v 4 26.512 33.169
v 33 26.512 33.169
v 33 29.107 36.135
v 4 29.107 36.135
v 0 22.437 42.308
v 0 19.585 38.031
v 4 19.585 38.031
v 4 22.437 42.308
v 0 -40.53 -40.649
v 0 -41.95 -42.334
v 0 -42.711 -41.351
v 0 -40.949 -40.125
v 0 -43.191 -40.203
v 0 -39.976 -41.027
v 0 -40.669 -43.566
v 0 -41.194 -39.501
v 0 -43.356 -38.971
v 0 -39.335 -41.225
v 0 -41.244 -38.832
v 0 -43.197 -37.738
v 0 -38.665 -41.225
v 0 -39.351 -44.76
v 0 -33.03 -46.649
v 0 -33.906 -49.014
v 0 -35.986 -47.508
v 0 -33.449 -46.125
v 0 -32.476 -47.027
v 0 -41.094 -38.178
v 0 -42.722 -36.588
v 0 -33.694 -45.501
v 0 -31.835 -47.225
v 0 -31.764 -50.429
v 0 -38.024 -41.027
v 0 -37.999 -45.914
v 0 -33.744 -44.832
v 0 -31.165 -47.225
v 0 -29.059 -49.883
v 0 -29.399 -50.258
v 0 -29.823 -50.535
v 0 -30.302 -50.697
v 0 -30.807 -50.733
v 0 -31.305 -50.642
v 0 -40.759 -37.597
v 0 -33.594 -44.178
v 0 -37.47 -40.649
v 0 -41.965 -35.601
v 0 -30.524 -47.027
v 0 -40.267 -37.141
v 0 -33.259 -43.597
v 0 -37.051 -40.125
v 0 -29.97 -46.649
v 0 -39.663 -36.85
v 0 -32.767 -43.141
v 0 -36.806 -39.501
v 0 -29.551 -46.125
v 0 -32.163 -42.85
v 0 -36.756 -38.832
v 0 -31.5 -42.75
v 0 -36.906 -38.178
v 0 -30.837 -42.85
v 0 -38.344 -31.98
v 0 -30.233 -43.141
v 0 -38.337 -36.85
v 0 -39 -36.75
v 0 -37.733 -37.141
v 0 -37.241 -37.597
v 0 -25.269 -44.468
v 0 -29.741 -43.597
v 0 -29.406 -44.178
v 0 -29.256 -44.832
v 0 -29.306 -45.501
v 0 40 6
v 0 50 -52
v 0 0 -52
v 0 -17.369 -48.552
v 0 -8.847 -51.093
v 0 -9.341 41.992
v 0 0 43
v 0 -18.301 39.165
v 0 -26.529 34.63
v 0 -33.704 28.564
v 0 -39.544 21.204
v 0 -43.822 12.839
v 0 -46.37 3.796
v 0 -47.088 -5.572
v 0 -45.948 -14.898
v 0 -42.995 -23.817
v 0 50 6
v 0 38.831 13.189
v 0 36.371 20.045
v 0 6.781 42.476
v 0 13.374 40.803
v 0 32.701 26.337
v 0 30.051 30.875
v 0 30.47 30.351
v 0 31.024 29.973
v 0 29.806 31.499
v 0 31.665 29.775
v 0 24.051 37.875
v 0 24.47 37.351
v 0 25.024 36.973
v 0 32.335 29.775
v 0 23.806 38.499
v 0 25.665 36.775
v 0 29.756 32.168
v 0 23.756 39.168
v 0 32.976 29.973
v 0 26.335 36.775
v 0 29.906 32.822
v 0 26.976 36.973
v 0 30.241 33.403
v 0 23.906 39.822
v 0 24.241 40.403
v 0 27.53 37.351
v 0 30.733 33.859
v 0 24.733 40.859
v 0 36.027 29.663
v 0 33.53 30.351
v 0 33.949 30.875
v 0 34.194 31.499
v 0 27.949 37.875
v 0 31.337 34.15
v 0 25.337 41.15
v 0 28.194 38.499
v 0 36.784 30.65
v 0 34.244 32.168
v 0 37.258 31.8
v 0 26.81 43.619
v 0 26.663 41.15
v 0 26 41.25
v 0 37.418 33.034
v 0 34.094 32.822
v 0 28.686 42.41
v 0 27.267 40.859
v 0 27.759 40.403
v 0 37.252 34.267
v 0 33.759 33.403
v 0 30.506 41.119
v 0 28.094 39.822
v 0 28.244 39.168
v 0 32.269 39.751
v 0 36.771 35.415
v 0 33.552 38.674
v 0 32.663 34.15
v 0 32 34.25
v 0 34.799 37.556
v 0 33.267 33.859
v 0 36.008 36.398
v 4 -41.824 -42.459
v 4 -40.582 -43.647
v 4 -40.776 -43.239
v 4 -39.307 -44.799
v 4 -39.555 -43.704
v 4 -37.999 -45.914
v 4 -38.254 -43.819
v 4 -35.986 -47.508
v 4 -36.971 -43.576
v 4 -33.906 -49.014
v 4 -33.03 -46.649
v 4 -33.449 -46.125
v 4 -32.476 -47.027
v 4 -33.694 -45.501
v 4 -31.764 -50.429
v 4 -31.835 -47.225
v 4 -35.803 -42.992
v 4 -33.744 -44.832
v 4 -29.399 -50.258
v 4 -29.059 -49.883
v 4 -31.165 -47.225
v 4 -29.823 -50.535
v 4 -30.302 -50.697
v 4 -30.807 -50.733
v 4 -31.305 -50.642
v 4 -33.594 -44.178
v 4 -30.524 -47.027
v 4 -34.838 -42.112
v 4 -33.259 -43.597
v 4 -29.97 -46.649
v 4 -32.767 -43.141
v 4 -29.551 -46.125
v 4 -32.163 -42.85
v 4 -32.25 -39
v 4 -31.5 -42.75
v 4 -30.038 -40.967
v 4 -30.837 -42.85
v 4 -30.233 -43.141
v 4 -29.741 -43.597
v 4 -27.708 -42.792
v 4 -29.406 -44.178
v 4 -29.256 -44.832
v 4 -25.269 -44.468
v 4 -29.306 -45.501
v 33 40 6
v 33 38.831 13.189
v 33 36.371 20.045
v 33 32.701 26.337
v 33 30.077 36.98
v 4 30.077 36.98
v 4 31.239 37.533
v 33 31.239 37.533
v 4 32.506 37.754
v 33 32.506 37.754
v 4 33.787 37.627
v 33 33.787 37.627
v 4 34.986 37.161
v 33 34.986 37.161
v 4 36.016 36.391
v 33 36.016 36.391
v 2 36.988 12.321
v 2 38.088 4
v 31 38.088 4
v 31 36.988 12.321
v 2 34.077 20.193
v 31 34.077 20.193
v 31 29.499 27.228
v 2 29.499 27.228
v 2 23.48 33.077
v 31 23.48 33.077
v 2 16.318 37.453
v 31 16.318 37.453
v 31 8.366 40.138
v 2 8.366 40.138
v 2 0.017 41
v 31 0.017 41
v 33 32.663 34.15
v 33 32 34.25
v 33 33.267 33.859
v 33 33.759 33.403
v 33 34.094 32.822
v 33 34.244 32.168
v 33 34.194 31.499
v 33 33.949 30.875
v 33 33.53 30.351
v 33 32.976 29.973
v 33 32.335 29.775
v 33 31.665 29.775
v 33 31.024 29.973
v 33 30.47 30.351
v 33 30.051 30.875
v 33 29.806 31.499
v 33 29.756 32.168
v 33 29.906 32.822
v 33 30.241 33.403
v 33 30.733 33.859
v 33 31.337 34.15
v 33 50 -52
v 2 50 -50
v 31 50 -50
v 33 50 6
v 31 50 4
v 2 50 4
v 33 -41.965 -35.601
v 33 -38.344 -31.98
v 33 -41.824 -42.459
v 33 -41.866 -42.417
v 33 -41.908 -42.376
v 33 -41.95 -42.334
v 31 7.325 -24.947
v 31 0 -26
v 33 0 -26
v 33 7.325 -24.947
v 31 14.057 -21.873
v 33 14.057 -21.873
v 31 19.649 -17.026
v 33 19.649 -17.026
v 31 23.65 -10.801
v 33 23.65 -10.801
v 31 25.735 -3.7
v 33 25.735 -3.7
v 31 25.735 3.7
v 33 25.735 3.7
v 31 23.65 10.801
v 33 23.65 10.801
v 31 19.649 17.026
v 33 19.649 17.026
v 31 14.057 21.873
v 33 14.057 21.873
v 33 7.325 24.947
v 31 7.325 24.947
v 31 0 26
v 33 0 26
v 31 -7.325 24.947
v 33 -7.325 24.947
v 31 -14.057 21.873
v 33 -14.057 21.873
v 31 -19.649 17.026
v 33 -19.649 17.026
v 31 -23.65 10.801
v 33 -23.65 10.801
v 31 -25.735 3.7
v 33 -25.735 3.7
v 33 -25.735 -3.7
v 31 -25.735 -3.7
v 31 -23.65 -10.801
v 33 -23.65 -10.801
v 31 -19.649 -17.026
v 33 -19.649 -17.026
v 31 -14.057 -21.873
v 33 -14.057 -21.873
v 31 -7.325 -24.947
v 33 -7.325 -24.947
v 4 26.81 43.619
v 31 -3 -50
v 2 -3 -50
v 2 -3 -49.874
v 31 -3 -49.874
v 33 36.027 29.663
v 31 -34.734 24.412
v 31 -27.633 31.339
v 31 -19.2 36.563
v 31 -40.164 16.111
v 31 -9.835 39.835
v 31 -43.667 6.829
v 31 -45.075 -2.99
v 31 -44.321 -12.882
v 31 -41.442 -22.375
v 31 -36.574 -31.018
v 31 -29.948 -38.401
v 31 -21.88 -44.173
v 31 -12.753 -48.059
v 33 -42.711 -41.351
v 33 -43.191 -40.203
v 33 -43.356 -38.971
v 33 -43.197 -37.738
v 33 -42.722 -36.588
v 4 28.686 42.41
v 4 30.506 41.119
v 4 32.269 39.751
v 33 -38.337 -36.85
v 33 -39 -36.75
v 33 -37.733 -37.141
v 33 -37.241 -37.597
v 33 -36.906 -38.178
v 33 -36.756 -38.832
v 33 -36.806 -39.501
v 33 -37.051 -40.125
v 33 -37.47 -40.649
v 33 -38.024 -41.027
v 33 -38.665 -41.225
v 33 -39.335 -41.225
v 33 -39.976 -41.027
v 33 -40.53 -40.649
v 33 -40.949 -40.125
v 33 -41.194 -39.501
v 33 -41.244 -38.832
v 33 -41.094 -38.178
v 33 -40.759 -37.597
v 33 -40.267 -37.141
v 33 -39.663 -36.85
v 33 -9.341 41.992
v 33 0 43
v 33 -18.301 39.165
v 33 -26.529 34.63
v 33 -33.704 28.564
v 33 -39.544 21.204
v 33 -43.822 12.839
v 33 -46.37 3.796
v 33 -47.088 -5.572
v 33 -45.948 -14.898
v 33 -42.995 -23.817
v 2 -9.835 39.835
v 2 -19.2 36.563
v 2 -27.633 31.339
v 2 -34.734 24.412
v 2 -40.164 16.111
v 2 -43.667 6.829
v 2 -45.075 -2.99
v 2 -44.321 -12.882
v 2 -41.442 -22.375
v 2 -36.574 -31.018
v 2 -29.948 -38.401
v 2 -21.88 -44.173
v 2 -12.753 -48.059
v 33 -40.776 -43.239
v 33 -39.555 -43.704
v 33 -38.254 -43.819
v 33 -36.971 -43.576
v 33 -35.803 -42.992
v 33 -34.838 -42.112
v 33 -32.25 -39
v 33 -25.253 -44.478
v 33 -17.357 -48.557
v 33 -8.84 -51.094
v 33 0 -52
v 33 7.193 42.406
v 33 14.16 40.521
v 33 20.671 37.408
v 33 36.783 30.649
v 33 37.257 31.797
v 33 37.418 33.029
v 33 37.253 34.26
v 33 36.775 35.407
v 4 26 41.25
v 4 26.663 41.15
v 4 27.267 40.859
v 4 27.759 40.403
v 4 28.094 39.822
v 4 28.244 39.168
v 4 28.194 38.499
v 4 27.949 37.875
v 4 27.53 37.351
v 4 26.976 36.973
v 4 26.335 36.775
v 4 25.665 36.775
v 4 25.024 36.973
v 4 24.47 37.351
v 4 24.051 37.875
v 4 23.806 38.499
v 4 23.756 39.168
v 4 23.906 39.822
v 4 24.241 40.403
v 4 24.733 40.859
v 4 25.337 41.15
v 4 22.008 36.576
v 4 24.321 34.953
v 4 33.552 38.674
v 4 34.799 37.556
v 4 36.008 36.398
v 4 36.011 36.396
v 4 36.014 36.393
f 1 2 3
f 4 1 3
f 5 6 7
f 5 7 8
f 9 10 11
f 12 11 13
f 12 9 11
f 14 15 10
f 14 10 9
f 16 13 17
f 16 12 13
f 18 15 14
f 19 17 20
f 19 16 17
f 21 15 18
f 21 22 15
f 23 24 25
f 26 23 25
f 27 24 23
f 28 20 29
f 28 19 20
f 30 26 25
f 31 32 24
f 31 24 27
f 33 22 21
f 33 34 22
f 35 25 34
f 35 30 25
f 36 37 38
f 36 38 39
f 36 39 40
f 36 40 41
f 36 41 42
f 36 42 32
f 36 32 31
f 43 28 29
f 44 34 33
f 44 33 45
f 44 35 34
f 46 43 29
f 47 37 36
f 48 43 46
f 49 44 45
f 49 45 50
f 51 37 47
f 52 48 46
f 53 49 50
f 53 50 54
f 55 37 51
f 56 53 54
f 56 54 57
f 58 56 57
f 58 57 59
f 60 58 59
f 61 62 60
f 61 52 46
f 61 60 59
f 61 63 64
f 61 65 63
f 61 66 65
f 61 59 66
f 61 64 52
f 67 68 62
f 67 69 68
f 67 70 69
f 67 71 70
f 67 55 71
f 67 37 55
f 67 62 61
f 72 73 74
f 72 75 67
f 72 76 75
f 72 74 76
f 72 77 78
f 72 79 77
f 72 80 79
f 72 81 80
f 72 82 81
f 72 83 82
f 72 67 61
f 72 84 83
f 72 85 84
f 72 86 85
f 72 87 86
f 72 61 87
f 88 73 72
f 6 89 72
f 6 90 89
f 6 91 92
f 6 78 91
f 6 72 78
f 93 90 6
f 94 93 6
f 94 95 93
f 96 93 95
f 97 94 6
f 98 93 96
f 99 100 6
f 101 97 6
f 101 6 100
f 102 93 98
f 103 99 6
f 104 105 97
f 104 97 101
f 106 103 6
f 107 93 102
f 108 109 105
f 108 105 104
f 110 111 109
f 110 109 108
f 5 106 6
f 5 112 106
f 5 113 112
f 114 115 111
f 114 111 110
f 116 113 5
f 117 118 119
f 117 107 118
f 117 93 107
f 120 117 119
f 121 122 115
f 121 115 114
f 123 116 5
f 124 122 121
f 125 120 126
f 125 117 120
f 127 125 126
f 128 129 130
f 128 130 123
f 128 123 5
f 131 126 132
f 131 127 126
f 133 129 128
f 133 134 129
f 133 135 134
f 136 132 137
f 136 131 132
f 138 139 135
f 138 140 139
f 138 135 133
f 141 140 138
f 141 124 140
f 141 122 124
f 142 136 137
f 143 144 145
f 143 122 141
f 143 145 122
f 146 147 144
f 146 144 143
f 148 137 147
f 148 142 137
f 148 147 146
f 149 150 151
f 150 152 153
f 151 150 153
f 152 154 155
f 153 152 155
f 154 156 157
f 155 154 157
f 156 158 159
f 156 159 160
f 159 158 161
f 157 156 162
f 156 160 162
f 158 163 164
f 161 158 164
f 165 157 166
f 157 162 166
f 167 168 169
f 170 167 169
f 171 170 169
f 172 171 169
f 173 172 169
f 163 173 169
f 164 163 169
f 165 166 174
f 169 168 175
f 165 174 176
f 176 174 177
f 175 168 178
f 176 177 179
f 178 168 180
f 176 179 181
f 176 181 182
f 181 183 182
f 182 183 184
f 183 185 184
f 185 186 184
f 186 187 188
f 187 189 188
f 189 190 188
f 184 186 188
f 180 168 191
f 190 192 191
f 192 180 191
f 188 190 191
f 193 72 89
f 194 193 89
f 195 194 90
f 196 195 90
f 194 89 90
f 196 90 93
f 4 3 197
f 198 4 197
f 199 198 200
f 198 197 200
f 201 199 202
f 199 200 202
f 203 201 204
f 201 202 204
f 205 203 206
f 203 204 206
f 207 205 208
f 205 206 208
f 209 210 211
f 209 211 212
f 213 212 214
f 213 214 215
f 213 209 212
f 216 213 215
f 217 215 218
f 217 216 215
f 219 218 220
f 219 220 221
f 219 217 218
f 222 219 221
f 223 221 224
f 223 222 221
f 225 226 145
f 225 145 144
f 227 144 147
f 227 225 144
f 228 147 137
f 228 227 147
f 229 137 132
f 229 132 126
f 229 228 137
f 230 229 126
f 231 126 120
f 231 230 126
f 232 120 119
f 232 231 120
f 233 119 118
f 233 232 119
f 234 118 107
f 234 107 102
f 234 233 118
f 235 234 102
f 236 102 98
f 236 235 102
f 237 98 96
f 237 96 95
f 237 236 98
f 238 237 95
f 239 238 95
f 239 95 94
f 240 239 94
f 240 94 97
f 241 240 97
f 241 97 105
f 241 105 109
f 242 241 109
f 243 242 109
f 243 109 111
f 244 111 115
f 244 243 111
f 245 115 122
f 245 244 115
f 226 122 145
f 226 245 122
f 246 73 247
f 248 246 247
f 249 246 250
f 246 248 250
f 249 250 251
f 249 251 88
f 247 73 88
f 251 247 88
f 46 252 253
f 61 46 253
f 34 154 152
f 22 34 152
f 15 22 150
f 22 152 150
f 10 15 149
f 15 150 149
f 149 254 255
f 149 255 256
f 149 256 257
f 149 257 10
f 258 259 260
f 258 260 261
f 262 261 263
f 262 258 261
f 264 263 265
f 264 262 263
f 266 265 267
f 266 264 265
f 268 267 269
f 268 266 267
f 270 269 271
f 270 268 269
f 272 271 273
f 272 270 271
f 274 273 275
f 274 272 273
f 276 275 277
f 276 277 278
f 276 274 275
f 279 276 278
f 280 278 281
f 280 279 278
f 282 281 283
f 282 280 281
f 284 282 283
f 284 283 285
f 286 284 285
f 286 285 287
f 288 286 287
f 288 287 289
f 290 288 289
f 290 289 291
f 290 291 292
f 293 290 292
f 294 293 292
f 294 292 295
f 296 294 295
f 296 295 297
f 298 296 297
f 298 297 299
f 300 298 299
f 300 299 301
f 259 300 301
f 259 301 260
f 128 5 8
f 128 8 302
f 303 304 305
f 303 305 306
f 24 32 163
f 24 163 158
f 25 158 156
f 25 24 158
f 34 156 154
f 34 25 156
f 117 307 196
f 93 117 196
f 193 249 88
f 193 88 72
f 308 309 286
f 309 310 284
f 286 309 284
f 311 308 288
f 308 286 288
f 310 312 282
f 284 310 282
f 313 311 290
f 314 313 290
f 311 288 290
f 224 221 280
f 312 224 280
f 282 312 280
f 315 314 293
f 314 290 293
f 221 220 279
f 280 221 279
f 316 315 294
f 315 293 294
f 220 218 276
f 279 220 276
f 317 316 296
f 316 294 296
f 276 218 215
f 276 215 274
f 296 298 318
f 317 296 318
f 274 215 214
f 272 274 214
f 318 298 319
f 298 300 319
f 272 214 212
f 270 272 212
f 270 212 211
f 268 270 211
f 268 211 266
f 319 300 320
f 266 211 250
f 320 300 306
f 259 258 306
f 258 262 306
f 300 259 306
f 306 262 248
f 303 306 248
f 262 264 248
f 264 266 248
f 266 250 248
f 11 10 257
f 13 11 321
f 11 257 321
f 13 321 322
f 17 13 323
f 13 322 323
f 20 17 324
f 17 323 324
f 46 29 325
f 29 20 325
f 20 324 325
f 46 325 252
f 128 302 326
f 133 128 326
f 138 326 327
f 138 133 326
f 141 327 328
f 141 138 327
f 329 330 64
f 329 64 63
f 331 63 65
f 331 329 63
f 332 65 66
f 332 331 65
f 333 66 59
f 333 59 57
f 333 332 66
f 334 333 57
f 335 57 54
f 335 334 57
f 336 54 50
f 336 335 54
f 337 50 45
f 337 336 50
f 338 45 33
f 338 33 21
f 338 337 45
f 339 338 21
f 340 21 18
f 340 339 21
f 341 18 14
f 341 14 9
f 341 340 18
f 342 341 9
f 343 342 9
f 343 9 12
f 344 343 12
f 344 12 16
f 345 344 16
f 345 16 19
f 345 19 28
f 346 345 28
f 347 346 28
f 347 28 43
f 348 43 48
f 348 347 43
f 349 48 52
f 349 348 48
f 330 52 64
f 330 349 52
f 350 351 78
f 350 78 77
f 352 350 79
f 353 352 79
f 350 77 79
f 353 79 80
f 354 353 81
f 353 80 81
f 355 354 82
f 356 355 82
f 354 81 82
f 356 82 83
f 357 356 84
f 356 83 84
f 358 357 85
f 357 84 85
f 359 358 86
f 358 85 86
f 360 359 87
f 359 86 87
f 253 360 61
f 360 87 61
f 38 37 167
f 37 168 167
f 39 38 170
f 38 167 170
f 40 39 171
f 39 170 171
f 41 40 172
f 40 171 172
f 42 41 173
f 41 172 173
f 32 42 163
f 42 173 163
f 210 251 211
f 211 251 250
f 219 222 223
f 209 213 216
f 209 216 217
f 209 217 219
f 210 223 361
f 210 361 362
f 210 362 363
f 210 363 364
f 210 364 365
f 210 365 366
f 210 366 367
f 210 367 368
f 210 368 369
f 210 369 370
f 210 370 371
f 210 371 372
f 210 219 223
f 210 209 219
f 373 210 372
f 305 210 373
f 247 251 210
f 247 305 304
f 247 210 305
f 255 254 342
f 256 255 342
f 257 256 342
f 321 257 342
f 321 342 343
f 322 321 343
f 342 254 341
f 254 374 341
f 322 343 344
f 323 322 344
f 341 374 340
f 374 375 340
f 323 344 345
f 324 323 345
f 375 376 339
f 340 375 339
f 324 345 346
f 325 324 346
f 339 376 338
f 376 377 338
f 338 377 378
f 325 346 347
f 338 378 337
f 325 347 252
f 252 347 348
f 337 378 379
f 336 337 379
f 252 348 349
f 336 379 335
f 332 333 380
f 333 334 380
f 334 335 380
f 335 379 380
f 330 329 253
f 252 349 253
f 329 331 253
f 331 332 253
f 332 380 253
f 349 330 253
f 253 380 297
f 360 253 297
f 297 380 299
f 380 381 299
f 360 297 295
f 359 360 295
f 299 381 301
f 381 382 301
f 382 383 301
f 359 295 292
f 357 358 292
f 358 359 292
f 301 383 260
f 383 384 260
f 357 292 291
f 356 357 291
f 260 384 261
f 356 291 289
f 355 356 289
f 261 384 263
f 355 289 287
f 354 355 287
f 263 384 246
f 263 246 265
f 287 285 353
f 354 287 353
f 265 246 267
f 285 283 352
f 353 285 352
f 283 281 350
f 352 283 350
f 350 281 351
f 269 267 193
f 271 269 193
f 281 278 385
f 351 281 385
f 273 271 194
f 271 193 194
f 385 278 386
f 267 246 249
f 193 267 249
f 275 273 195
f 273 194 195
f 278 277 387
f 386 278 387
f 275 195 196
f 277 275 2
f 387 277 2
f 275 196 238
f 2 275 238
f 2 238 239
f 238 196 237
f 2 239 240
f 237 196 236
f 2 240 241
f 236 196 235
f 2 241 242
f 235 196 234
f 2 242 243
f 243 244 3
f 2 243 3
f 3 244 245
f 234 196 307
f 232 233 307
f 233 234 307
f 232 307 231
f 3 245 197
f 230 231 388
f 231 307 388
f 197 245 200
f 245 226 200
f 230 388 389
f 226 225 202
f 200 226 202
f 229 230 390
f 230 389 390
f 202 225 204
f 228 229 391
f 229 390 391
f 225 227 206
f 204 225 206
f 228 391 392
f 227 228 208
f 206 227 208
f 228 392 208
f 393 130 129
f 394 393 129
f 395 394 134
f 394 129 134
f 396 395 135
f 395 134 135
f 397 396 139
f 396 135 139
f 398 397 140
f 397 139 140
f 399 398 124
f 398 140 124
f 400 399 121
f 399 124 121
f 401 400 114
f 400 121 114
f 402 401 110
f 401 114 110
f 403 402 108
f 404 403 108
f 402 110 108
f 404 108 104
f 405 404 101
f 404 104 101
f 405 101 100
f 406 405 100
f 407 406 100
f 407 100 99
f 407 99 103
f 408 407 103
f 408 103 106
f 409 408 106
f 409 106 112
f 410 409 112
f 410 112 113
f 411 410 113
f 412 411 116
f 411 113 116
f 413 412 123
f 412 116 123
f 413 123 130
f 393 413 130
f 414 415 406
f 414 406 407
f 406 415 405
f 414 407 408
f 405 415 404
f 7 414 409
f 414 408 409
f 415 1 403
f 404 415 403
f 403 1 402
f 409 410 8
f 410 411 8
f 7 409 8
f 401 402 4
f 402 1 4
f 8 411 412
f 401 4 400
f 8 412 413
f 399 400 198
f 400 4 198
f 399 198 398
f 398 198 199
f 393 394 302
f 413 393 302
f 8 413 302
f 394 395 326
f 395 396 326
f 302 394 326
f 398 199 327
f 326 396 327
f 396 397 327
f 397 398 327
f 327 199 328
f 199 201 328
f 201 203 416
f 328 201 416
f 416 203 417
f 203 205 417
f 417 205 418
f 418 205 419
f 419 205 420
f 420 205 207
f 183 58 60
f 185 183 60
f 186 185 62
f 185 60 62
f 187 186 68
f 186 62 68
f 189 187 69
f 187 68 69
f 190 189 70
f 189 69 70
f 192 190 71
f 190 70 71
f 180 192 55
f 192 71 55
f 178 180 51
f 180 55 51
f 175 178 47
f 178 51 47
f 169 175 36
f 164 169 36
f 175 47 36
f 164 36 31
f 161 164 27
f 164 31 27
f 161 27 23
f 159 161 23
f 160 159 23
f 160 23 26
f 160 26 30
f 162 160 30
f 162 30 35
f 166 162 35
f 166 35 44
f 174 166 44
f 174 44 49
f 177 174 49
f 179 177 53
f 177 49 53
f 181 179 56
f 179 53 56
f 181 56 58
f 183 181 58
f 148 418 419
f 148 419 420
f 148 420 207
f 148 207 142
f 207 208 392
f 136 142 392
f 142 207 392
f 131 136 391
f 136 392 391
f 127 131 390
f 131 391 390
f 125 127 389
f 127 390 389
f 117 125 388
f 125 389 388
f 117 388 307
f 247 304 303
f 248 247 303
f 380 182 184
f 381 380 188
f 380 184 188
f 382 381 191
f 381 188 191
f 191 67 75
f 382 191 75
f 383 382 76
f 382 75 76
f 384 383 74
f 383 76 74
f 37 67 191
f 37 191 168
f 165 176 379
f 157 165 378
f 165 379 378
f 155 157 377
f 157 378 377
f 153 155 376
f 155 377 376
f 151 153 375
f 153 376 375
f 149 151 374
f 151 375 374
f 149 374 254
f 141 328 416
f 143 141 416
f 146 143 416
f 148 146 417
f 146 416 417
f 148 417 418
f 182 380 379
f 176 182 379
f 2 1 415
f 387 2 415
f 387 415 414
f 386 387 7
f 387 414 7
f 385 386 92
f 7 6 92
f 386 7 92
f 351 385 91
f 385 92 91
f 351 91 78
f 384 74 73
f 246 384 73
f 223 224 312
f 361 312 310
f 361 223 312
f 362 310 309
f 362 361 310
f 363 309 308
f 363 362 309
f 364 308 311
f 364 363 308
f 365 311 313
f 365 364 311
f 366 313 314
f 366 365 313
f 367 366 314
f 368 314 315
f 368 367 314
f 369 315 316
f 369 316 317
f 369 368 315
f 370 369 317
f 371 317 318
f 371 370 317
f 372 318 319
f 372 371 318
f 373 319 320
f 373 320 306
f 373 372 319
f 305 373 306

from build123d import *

# Parameters (mm, degrees)
SKETCH1_R               = 26
BOSS_EXTRUDE1_DEPTH     = 33
SHELL1_START            = 2
SHELL1_OUTLINE_R        = 28
SHELL1_DEPTH            = 29
SKETCH2_W               = 29
SKETCH2_H               = 54
CUT_EXTRUDE1_DEPTH      = 53
SKETCH3_R               = 26
BOSS_EXTRUDE2_DEPTH     = 2
SKETCH4_R               = 31.708367963
CUT_EXTRUDE2_DEPTH      = 29
SKETCH5_R               = 2.25
BOSS_EXTRUDE3_DEPTH     = 4
FILLET1_R               = 2
CHAMFER1_SIZE           = 3.326511139
BOSS_EXTRUDE4_START     = -33
BOSS_EXTRUDE4_OUTLINE_R = 2.25
BOSS_EXTRUDE4_DEPTH     = 33
FILLET2_R               = 4.75


with BuildPart() as part:
    # Sketch1 → Boss-Extrude1 (new body)
    with BuildSketch(Plane(origin=(0, 0, 0), x_dir=(0, 0, -1), z_dir=(1, 0, 0))):
        with BuildLine():
            Line((52, 0), (52, 50))
            Line((52, 50), (0, 50))
            Line((0, 50), (-6, 50))
            Line((-6, 50), (-6, 40))
            ThreePointArc((-6, 40), (-32.429333818, 27.334633781), (-43, 0))
            ThreePointArc((-43, 0), (4.5, -47.1), (52, 0))
        make_face()
        Circle(SKETCH1_R, mode=Mode.SUBTRACT)
    extrude(amount=BOSS_EXTRUDE1_DEPTH)

    # Shell1: read off the stored shape, not the designer's step
    # Shell1 outline → Shell1 (cut)
    with BuildSketch(Plane.YZ.offset(SHELL1_START)):
        with BuildLine():
            ThreePointArc((0.016913017, 41.000071514), (-45.099999808, -4.495817139), (0.0085476, -50))
            Line((0.0085476, -50), (48, -50))
            Line((48, -50), (48, 4))
            Line((48, 4), (38.088170021, 4))
            ThreePointArc((38.088170021, 4), (26.652605024, 30.320127965), (0.016913017, 41.000071514))
        make_face()
        Circle(SHELL1_OUTLINE_R, mode=Mode.SUBTRACT)
    extrude(amount=SHELL1_DEPTH, mode=Mode.SUBTRACT)

    # Sketch2 → Cut-Extrude1 (cut)
    with BuildSketch(Plane(origin=(0, 50, 0), x_dir=(1, 0, 0), z_dir=(0, 1, 0))):
        with Locations((16.5, 23)):
            Rectangle(SKETCH2_W, SKETCH2_H)
    extrude(amount=-CUT_EXTRUDE1_DEPTH, mode=Mode.SUBTRACT)

    # Sketch3 → Boss-Extrude2 (add)
    with BuildSketch(Plane.ZY):
        with Locations(Location((0, 0, 0), (0, 0, 81.150116902))):
            Circle(SKETCH3_R)
    extrude(amount=-BOSS_EXTRUDE2_DEPTH)

    # Sketch4 → Cut-Extrude2 (cut)
    with BuildSketch(Plane(origin=(31, 0, 0), x_dir=(0, 0, -1), z_dir=(1, 0, 0))):
        Circle(SKETCH4_R)
    extrude(amount=-CUT_EXTRUDE2_DEPTH, mode=Mode.SUBTRACT)

    # Sketch5 → Boss-Extrude3 (add)
    # profile 1 of 2: a face of its own
    with BuildSketch(Plane.ZY):
        with BuildLine():
            ThreePointArc((-51.418984108, -30.13414218), (-48.82497471, -34.177482297), (-45.913745602, -37.998768617))
            Line((-45.913745602, -37.998768617), (-38.477731669, -32.793558864))
            ThreePointArc((-38.477731669, -32.793558864), (-41.663875667, -29.183056126), (-44.468117742, -25.268535724))
            Line((-44.468117742, -25.268535724), (-51.418984108, -30.13414218))
        make_face()
        with Locations((-45, -31.5)):
            Circle(SKETCH5_R, mode=Mode.SUBTRACT)
    # profile 2 of 2: a face of its own
    with BuildSketch(Plane.ZY):
        with BuildLine():
            ThreePointArc((32.398527193, 27.367900169), (35.450790949, 23.647327492), (38.031195395, 19.585248223))
            Line((38.031195395, 19.585248223), (45.075911525, 24.281725643))
            ThreePointArc((45.075911525, 24.281725643), (42.60097507, 28.400650047), (39.750789641, 32.269408468))
            Line((39.750789641, 32.269408468), (32.398527193, 27.367900169))
        make_face()
        with Locations((39, 26)):
            Circle(SKETCH5_R, mode=Mode.SUBTRACT)
    extrude(amount=-BOSS_EXTRUDE3_DEPTH)

    # Fillet1
    fillet1_edges = [part.edges().sort_by_distance(p)[0] for p in [
        (2, -30.13414218, -51.418984108),
    ]]
    fillet(fillet1_edges, radius=FILLET1_R)

    # Chamfer1
    # the kernel refuses this chamfer: 3.326511139, 3 mm, written as the material it takes off along each edge
    with BuildSketch(Plane(origin=(-8.575137871, 24.281725643, 45.075911525), x_dir=(0, -0.5547001962252163, -0.8320502943378523), z_dir=(1, 0, 0))) as chamfer1_piece_1:
        with BuildLine():
            Line((CHAMFER1_SIZE, 0), (-0.190667191, 2.911795765))
            ThreePointArc((-0.190667191, 2.911795765), (-0.119044869, 1.500102705), (0, 0))
            Line((0, 0), (CHAMFER1_SIZE, 0))
        make_face()
    extrude(amount=21.150275743, mode=Mode.SUBTRACT)

    # Boss-Extrude4: read off the stored shape, not the designer's step
    # Boss-Extrude4 outline → Boss-Extrude4 (add)
    # profile 1 of 2: a face of its own
    with BuildSketch(Plane.ZY.offset(BOSS_EXTRUDE4_START)):
        with BuildLine():
            ThreePointArc((26.336648486, 32.700609517), (29.932721568, 29.805201706), (33.168906621, 26.512446886))
            Line((33.168906621, 26.512446886), (39.750789641, 32.269408468))
            ThreePointArc((39.750789641, 32.269408468), (36.48342014, 35.922138784), (32.881782461, 39.245743491))
            Line((32.881782461, 39.245743491), (26.336648486, 32.700609517))
        make_face()
        with Locations((32, 32)):
            Circle(BOSS_EXTRUDE4_OUTLINE_R, mode=Mode.SUBTRACT)
    # profile 2 of 2: a face of its own
    with BuildSketch(Plane.ZY.offset(BOSS_EXTRUDE4_START)):
        with BuildLine():
            Line((-38.840294261, -45.204092661), (-31.980263742, -38.344223418))
            ThreePointArc((-31.980263742, -38.344223418), (-35.639554577, -35.469452882), (-39, -32.250427936))
            Line((-39, -32.250427936), (-45.913745602, -37.998768617))
            ThreePointArc((-45.913745602, -37.998768617), (-42.529883516, -41.751496496), (-38.840294261, -45.204092661))
        make_face()
        with Locations((-39, -39)):
            Circle(BOSS_EXTRUDE4_OUTLINE_R, mode=Mode.SUBTRACT)
    extrude(amount=BOSS_EXTRUDE4_DEPTH)

    # Fillet2
    # the kernel refuses this fillet: 4.75 mm, written as the material it takes off along each edge
    with BuildSketch(Plane(origin=(45.884989722, -37.998768617, -45.913745602), x_dir=(0, -0.742095530004095, 0.6702941327118576), z_dir=(-1, 0, 0))) as fillet2_piece_1:
        with BuildLine():
            CenterArc((4.948609093, 4.745557529), FILLET2_R, 177.651602882, 94.826600607)
            Line((0.202598429, 4.940192516), (0, 0))
            ThreePointArc((0, 0), (2.576997944, -0.055739892), (5.153995889, 0))
        make_face()
    extrude(amount=41.884989722, mode=Mode.SUBTRACT)
    with BuildSketch(Plane(origin=(44.936529157, -45.204092661, -38.840294261), x_dir=(0, 0.6815583401392785, -0.7317637794989523), z_dir=(-1, 0, 0))) as fillet2_piece_2:
        with BuildLine():
            CenterArc((4.584343333, -4.746187729), FILLET2_R, 87.70431796, 90.260546116)
            Line((-0.162660545, -4.577504047), (0, 0))
            ThreePointArc((0, 0), (2.387305831, 0.047832742), (4.774611663, 0))
        make_face()
    extrude(amount=56.873058314, mode=Mode.SUBTRACT)
    with BuildSketch(Plane(origin=(44.949107529, 39.245743491, 32.881782461), x_dir=(0, -0.6773005061883329, 0.735706479730217), z_dir=(-1, 0, 0))) as fillet2_piece_3:
        with BuildLine():
            CenterArc((4.557931056, -4.744822843), FILLET2_R, 87.324678627, 90.308374896)
            Line((-0.188016347, -4.548651358), (0, 0))
            ThreePointArc((0, 0), (2.389821506, 0.055804306), (4.779643012, 0))
        make_face()
    extrude(amount=56.898215059, mode=Mode.SUBTRACT)
    with BuildSketch(Plane(origin=(45.609389119, 32.269408468, 39.750789641), x_dir=(0, -0.6583630051662173, -0.7527005735539911), z_dir=(-1, 0, 0))) as fillet2_piece_4:
        with BuildLine():
            CenterArc((4.804098652, -4.75), FILLET2_R, 90, 93.540841906)
            ThreePointArc((0.06316627, -5.043360096), (-0.030557791, -2.522458341), (0, 0))
            Line((0, 0), (4.804098652, 0))
        make_face()
    extrude(amount=41.609389119, mode=Mode.SUBTRACT)


solid = part.part
